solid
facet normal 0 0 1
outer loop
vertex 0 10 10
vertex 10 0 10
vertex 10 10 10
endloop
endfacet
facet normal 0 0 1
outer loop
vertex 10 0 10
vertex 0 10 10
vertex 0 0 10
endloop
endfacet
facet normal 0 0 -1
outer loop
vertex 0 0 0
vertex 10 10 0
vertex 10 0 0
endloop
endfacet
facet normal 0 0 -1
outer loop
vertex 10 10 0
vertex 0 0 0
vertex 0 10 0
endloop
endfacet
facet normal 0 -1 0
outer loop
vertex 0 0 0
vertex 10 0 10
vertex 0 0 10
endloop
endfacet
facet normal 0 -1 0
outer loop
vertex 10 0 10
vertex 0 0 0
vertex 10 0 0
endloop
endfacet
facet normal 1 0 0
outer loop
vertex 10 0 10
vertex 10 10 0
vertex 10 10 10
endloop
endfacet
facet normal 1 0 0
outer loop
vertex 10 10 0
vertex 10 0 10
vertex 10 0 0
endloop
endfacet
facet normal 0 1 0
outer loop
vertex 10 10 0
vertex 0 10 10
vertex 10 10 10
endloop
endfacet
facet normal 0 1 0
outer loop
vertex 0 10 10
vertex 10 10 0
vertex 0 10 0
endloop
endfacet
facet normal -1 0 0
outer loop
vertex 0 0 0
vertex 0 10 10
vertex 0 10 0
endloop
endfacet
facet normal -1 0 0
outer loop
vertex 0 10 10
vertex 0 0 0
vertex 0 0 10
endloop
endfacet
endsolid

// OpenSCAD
// Generated by scadwright. Do not hand-edit —
// edit the Python source and regenerate.

// _Box
cube([10, 10, 10], center=false);
